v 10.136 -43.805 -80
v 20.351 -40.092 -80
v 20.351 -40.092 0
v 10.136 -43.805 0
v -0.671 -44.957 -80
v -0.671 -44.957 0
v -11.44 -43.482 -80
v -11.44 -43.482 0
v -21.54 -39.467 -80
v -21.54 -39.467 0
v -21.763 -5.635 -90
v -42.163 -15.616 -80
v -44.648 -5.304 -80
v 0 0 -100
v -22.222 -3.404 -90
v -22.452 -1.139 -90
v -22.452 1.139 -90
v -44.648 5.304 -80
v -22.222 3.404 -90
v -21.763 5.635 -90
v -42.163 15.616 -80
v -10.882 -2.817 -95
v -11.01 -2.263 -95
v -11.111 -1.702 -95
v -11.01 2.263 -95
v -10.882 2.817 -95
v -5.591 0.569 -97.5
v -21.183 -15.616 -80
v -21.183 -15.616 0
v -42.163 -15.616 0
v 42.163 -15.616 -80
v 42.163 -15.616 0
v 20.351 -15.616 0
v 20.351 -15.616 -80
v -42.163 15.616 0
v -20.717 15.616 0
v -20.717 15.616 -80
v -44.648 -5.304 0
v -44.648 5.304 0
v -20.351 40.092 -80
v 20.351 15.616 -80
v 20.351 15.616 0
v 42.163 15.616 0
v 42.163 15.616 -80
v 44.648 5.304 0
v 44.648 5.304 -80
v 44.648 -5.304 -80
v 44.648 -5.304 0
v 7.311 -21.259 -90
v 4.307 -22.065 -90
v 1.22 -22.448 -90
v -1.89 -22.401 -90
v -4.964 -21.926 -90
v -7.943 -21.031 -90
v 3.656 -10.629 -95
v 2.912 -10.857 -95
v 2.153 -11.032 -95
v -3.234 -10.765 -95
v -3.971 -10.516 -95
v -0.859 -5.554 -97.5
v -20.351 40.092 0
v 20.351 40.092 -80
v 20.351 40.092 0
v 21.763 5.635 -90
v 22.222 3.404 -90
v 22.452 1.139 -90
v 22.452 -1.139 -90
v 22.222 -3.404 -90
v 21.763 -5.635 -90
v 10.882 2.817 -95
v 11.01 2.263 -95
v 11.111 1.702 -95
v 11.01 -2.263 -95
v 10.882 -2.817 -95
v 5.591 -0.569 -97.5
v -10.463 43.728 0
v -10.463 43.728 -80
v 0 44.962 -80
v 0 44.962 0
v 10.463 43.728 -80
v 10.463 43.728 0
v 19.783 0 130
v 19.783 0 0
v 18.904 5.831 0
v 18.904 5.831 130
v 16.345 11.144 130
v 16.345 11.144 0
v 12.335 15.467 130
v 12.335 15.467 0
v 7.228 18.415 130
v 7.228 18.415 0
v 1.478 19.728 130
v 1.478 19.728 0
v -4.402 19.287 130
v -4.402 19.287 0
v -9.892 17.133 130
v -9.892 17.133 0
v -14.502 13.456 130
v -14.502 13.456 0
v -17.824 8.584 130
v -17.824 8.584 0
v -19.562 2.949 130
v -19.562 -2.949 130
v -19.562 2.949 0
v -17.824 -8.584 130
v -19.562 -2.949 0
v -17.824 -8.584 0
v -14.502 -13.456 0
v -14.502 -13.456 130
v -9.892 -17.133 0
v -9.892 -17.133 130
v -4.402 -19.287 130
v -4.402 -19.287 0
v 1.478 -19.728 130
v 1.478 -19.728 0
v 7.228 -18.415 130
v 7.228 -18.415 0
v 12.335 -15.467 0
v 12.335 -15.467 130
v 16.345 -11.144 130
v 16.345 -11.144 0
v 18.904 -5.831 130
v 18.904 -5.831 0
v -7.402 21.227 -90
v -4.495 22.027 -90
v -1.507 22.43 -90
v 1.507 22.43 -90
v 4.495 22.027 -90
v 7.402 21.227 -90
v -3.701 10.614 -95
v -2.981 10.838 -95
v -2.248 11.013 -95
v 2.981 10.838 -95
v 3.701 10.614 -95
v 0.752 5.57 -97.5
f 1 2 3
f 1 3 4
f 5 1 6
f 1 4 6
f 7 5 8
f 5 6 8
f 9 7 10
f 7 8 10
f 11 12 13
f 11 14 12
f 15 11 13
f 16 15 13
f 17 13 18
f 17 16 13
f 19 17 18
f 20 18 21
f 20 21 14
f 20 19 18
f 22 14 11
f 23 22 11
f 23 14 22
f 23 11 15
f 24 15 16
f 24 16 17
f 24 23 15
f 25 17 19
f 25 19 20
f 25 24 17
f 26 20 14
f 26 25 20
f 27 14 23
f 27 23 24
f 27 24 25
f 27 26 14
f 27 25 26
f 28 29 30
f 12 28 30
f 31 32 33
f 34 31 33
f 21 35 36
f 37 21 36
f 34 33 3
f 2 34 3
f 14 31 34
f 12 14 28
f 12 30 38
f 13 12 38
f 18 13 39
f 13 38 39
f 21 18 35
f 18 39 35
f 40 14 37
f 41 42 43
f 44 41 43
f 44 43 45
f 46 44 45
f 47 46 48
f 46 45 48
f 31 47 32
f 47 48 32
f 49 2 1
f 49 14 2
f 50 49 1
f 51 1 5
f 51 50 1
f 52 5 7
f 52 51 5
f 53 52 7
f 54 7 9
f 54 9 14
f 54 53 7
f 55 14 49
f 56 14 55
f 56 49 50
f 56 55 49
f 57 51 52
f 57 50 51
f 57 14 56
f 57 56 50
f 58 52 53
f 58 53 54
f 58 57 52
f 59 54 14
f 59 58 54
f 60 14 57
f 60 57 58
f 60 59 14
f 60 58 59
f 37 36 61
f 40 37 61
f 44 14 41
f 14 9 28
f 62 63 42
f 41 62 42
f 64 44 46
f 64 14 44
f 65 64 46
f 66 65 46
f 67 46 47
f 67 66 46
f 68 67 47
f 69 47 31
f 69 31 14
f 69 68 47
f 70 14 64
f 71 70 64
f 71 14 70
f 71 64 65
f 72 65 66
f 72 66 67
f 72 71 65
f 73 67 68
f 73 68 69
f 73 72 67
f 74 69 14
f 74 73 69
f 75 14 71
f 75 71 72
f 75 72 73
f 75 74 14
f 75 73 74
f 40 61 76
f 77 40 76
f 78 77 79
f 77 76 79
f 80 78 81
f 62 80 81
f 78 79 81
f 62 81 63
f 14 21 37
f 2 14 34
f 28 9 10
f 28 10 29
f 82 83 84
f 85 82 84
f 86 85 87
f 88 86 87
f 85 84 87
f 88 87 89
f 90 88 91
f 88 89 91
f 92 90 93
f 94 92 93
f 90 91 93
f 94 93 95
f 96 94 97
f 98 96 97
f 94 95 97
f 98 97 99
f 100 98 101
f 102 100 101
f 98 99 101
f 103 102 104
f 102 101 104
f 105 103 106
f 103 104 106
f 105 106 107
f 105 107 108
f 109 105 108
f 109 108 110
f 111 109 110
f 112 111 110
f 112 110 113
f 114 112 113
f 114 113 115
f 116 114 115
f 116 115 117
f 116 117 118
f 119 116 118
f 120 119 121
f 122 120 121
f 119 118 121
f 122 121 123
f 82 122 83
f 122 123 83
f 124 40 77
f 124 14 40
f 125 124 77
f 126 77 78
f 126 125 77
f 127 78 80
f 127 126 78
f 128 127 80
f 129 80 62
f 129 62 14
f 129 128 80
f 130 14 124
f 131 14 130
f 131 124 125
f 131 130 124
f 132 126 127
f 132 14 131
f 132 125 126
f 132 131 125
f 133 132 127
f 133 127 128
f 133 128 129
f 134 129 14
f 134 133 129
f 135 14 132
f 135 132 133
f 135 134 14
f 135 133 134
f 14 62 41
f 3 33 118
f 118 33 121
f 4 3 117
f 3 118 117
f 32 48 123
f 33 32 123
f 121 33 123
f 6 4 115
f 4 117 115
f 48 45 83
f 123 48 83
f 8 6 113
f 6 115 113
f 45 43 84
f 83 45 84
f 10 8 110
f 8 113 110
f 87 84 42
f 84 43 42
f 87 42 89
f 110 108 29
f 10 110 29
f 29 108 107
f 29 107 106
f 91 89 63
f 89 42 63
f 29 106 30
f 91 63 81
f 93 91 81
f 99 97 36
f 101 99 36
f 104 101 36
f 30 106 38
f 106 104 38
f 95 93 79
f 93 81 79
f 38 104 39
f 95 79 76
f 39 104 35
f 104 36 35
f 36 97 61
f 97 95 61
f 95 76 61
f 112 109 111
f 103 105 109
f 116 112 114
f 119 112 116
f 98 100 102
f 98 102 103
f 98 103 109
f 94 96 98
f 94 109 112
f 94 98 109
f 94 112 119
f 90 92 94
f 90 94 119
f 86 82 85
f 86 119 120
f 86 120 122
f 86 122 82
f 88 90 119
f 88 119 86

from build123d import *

# Parameters (mm, degrees)
SKETCH_1_R      = 19.783013461
EXTRUDE_1_DEPTH = 130
EXTRUDE_2_DEPTH = 80


with BuildPart() as part:
    # 草图1 → 凸台-拉伸1 (new body)
    with BuildSketch(Plane.XY):
        Circle(SKETCH_1_R)
    extrude(amount=EXTRUDE_1_DEPTH)

    # 草图2 → 凸台-拉伸2 (add)
    with BuildSketch(Plane(origin=(0, 0, 0), x_dir=(-1, 0, 0), z_dir=(0, 0, -1))):
        with BuildLine():
            Line((-20.351449461, 40.092355437), (-20.351449461, 15.61573037))
            Line((-20.351449461, 15.61573037), (-42.163105017, 15.61573037))
            ThreePointArc((-42.163105017, 15.61573037), (-44.961966813, 0), (-42.163105017, -15.61573037))
            Line((-42.163105017, -15.61573037), (-20.351449461, -15.61573037))
            Line((-20.351449461, -15.61573037), (-20.351449461, -40.092355437))
            ThreePointArc((-20.351449461, -40.092355437), (0.671443732, -44.956952999), (21.539684559, -39.466700505))
            Line((21.539684559, -39.466700505), (21.183464145, -15.61573037))
            Line((21.183464145, -15.61573037), (42.163105017, -15.61573037))
            ThreePointArc((42.163105017, -15.61573037), (44.961966813, 0), (42.163105017, 15.61573037))
            Line((42.163105017, 15.61573037), (20.717014193, 15.61573037))
            Line((20.717014193, 15.61573037), (20.351449461, 40.092355437))
            ThreePointArc((20.351449461, 40.092355437), (0, 44.961966813), (-20.351449461, 40.092355437))
        make_face()
    extrude(amount=EXTRUDE_2_DEPTH)

    # 草图4 → 放样1 section 0
    with BuildSketch(Plane(origin=(0, 0, -80), x_dir=(-1, 0, 0), z_dir=(0, 0, -1)), mode=Mode.PRIVATE) as loft_1_s0:
        with BuildLine():
            Line((-20.351449461, 15.61573037), (-42.163105017, 15.61573037))
            ThreePointArc((-42.163105017, 15.61573037), (-44.961966813, 0), (-42.163105017, -15.61573037))
            Line((-42.163105017, -15.61573037), (-20.351449461, -15.61573037))
            Line((-20.351449461, -15.61573037), (-20.351449461, -40.092355437))
            ThreePointArc((-20.351449461, -40.092355437), (0.671443732, -44.956952999), (21.539684559, -39.466700505))
            Line((21.539684559, -39.466700505), (21.183464145, -15.61573037))
            Line((21.183464145, -15.61573037), (42.163105017, -15.61573037))
            ThreePointArc((42.163105017, -15.61573037), (44.961966813, 0), (42.163105017, 15.61573037))
            Line((42.163105017, 15.61573037), (20.717014193, 15.61573037))
            Line((20.717014193, 15.61573037), (20.351449461, 40.092355437))
            ThreePointArc((20.351449461, 40.092355437), (0, 44.961966813), (-20.351449461, 40.092355437))
            Line((-20.351449461, 40.092355437), (-20.351449461, 15.61573037))
        make_face()
    loft([loft_1_s0.sketch, Vertex(0, 0, -100)])


solid = part.part
